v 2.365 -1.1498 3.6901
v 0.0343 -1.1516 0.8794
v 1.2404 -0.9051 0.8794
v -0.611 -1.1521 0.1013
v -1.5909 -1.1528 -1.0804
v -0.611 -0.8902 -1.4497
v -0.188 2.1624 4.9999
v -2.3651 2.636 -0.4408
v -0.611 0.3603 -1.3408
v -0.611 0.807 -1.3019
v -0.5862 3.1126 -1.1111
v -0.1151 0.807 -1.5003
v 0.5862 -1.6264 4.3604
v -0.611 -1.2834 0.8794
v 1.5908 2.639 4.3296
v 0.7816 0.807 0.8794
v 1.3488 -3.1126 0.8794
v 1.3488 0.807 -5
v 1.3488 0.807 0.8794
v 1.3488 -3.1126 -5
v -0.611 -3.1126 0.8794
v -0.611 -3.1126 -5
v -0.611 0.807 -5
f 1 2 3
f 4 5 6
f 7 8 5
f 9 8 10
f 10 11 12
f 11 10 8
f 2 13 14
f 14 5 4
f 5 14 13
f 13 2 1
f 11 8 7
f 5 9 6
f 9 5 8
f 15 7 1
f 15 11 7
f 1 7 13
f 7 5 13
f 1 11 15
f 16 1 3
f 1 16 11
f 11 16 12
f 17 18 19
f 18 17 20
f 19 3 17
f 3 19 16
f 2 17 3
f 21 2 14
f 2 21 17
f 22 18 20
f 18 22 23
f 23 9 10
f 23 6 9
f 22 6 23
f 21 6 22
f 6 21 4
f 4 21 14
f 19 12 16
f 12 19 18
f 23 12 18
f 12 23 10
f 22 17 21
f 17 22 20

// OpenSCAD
// Begin.
union() {
rotate([100, 20.0001, 15])
translate([-0.374936, 1.44358, -0.983411])
cube(size = [1.9598, 5.87927, 3.91963], center = true);

rotate([0, -0, 0])
translate([0.36893, -1.15281, -2.06032])
cube(size = [1.95978, 3.91957, 5.87935], center = true);
}
// End.
